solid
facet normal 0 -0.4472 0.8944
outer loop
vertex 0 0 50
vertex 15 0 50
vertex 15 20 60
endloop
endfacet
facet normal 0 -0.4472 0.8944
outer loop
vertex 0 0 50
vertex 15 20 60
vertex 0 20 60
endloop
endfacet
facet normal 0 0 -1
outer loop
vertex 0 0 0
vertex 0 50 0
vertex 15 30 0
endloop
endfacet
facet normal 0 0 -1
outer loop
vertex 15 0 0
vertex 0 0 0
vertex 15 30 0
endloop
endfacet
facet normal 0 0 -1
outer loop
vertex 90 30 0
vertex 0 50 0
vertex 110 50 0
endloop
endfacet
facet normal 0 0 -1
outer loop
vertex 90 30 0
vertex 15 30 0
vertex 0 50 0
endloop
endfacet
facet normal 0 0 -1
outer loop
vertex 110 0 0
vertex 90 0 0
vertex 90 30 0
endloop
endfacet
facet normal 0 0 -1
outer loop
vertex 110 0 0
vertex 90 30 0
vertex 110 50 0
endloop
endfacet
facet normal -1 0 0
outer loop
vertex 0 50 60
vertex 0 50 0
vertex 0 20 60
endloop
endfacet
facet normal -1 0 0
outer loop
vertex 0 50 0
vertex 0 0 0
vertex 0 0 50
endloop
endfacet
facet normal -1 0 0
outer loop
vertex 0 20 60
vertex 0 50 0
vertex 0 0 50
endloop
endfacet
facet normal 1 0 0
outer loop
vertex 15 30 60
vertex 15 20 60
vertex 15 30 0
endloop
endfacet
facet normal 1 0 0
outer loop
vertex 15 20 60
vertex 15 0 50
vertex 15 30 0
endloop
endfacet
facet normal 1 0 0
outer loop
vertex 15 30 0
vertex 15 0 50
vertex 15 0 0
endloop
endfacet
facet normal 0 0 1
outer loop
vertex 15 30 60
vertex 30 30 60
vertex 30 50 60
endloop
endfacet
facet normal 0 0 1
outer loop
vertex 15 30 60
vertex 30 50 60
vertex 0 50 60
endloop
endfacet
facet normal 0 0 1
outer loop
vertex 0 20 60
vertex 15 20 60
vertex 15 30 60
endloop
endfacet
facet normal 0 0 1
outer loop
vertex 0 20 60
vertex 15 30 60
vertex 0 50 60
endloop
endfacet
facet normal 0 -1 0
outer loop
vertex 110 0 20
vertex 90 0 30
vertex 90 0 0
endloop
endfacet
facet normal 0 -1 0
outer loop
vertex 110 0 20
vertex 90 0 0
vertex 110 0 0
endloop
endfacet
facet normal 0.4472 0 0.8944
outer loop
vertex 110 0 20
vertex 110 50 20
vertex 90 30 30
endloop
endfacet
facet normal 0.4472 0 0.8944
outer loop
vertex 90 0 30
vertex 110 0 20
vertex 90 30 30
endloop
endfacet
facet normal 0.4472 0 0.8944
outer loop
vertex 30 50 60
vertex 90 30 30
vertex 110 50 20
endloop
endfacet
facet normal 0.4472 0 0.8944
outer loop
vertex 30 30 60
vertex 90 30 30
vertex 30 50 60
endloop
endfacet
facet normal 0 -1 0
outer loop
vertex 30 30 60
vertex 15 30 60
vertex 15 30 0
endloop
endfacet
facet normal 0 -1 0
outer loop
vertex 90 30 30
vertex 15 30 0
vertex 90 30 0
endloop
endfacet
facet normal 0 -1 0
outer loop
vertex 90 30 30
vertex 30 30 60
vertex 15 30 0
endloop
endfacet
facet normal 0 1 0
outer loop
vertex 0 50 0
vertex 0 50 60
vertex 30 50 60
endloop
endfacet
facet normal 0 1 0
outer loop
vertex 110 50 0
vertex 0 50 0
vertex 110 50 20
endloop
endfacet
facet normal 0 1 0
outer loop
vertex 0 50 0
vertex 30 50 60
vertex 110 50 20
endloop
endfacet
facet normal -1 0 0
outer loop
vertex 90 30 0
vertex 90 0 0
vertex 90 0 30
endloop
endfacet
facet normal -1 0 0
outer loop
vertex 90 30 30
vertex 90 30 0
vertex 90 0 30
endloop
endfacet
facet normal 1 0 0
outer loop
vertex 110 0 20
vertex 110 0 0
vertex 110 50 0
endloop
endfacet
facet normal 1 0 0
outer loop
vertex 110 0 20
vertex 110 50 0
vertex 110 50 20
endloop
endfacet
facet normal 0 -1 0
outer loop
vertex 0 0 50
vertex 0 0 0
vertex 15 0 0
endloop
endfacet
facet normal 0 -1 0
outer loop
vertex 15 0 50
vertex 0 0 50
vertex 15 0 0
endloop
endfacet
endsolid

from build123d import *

# Parameters (mm, degrees)
F0_W     = 15
F0_H     = 60
F1_DEPTH = 50
F2_DEPTH = 30
F3_SIZE2 = 10
F3_SIZE  = 20


with BuildPart() as f1:
    # F0 (on Front) → F1 (new body)
    with BuildSketch(Plane.XZ):
        with Locations((7.5, 30)):
            Rectangle(F0_W, F0_H)
        Polygon((15, 60), (15, 0), (90, 0), (90, 30), (30, 60), align=None)
        Polygon((90, 30), (90, 0), (110, 0), (110, 20), align=None)
    extrude(amount=-F1_DEPTH)

    # F0 (on Front) → F2 (cut)
    with BuildSketch(Plane.XZ):
        Polygon((15, 60), (15, 0), (90, 0), (90, 30), (30, 60), align=None)
    extrude(amount=-F2_DEPTH, mode=Mode.SUBTRACT)

    # F3
    f3_edges = [f1.edges().sort_by_distance(p)[0] for p in [
        (7.5, 0, 60),
    ]]
    f3_side = f1.faces().sort_by_distance((11.785714, 29.285714, 60))[0]
    chamfer(f3_edges, length=F3_SIZE, length2=F3_SIZE2, reference=f3_side)


solid = f1.part
